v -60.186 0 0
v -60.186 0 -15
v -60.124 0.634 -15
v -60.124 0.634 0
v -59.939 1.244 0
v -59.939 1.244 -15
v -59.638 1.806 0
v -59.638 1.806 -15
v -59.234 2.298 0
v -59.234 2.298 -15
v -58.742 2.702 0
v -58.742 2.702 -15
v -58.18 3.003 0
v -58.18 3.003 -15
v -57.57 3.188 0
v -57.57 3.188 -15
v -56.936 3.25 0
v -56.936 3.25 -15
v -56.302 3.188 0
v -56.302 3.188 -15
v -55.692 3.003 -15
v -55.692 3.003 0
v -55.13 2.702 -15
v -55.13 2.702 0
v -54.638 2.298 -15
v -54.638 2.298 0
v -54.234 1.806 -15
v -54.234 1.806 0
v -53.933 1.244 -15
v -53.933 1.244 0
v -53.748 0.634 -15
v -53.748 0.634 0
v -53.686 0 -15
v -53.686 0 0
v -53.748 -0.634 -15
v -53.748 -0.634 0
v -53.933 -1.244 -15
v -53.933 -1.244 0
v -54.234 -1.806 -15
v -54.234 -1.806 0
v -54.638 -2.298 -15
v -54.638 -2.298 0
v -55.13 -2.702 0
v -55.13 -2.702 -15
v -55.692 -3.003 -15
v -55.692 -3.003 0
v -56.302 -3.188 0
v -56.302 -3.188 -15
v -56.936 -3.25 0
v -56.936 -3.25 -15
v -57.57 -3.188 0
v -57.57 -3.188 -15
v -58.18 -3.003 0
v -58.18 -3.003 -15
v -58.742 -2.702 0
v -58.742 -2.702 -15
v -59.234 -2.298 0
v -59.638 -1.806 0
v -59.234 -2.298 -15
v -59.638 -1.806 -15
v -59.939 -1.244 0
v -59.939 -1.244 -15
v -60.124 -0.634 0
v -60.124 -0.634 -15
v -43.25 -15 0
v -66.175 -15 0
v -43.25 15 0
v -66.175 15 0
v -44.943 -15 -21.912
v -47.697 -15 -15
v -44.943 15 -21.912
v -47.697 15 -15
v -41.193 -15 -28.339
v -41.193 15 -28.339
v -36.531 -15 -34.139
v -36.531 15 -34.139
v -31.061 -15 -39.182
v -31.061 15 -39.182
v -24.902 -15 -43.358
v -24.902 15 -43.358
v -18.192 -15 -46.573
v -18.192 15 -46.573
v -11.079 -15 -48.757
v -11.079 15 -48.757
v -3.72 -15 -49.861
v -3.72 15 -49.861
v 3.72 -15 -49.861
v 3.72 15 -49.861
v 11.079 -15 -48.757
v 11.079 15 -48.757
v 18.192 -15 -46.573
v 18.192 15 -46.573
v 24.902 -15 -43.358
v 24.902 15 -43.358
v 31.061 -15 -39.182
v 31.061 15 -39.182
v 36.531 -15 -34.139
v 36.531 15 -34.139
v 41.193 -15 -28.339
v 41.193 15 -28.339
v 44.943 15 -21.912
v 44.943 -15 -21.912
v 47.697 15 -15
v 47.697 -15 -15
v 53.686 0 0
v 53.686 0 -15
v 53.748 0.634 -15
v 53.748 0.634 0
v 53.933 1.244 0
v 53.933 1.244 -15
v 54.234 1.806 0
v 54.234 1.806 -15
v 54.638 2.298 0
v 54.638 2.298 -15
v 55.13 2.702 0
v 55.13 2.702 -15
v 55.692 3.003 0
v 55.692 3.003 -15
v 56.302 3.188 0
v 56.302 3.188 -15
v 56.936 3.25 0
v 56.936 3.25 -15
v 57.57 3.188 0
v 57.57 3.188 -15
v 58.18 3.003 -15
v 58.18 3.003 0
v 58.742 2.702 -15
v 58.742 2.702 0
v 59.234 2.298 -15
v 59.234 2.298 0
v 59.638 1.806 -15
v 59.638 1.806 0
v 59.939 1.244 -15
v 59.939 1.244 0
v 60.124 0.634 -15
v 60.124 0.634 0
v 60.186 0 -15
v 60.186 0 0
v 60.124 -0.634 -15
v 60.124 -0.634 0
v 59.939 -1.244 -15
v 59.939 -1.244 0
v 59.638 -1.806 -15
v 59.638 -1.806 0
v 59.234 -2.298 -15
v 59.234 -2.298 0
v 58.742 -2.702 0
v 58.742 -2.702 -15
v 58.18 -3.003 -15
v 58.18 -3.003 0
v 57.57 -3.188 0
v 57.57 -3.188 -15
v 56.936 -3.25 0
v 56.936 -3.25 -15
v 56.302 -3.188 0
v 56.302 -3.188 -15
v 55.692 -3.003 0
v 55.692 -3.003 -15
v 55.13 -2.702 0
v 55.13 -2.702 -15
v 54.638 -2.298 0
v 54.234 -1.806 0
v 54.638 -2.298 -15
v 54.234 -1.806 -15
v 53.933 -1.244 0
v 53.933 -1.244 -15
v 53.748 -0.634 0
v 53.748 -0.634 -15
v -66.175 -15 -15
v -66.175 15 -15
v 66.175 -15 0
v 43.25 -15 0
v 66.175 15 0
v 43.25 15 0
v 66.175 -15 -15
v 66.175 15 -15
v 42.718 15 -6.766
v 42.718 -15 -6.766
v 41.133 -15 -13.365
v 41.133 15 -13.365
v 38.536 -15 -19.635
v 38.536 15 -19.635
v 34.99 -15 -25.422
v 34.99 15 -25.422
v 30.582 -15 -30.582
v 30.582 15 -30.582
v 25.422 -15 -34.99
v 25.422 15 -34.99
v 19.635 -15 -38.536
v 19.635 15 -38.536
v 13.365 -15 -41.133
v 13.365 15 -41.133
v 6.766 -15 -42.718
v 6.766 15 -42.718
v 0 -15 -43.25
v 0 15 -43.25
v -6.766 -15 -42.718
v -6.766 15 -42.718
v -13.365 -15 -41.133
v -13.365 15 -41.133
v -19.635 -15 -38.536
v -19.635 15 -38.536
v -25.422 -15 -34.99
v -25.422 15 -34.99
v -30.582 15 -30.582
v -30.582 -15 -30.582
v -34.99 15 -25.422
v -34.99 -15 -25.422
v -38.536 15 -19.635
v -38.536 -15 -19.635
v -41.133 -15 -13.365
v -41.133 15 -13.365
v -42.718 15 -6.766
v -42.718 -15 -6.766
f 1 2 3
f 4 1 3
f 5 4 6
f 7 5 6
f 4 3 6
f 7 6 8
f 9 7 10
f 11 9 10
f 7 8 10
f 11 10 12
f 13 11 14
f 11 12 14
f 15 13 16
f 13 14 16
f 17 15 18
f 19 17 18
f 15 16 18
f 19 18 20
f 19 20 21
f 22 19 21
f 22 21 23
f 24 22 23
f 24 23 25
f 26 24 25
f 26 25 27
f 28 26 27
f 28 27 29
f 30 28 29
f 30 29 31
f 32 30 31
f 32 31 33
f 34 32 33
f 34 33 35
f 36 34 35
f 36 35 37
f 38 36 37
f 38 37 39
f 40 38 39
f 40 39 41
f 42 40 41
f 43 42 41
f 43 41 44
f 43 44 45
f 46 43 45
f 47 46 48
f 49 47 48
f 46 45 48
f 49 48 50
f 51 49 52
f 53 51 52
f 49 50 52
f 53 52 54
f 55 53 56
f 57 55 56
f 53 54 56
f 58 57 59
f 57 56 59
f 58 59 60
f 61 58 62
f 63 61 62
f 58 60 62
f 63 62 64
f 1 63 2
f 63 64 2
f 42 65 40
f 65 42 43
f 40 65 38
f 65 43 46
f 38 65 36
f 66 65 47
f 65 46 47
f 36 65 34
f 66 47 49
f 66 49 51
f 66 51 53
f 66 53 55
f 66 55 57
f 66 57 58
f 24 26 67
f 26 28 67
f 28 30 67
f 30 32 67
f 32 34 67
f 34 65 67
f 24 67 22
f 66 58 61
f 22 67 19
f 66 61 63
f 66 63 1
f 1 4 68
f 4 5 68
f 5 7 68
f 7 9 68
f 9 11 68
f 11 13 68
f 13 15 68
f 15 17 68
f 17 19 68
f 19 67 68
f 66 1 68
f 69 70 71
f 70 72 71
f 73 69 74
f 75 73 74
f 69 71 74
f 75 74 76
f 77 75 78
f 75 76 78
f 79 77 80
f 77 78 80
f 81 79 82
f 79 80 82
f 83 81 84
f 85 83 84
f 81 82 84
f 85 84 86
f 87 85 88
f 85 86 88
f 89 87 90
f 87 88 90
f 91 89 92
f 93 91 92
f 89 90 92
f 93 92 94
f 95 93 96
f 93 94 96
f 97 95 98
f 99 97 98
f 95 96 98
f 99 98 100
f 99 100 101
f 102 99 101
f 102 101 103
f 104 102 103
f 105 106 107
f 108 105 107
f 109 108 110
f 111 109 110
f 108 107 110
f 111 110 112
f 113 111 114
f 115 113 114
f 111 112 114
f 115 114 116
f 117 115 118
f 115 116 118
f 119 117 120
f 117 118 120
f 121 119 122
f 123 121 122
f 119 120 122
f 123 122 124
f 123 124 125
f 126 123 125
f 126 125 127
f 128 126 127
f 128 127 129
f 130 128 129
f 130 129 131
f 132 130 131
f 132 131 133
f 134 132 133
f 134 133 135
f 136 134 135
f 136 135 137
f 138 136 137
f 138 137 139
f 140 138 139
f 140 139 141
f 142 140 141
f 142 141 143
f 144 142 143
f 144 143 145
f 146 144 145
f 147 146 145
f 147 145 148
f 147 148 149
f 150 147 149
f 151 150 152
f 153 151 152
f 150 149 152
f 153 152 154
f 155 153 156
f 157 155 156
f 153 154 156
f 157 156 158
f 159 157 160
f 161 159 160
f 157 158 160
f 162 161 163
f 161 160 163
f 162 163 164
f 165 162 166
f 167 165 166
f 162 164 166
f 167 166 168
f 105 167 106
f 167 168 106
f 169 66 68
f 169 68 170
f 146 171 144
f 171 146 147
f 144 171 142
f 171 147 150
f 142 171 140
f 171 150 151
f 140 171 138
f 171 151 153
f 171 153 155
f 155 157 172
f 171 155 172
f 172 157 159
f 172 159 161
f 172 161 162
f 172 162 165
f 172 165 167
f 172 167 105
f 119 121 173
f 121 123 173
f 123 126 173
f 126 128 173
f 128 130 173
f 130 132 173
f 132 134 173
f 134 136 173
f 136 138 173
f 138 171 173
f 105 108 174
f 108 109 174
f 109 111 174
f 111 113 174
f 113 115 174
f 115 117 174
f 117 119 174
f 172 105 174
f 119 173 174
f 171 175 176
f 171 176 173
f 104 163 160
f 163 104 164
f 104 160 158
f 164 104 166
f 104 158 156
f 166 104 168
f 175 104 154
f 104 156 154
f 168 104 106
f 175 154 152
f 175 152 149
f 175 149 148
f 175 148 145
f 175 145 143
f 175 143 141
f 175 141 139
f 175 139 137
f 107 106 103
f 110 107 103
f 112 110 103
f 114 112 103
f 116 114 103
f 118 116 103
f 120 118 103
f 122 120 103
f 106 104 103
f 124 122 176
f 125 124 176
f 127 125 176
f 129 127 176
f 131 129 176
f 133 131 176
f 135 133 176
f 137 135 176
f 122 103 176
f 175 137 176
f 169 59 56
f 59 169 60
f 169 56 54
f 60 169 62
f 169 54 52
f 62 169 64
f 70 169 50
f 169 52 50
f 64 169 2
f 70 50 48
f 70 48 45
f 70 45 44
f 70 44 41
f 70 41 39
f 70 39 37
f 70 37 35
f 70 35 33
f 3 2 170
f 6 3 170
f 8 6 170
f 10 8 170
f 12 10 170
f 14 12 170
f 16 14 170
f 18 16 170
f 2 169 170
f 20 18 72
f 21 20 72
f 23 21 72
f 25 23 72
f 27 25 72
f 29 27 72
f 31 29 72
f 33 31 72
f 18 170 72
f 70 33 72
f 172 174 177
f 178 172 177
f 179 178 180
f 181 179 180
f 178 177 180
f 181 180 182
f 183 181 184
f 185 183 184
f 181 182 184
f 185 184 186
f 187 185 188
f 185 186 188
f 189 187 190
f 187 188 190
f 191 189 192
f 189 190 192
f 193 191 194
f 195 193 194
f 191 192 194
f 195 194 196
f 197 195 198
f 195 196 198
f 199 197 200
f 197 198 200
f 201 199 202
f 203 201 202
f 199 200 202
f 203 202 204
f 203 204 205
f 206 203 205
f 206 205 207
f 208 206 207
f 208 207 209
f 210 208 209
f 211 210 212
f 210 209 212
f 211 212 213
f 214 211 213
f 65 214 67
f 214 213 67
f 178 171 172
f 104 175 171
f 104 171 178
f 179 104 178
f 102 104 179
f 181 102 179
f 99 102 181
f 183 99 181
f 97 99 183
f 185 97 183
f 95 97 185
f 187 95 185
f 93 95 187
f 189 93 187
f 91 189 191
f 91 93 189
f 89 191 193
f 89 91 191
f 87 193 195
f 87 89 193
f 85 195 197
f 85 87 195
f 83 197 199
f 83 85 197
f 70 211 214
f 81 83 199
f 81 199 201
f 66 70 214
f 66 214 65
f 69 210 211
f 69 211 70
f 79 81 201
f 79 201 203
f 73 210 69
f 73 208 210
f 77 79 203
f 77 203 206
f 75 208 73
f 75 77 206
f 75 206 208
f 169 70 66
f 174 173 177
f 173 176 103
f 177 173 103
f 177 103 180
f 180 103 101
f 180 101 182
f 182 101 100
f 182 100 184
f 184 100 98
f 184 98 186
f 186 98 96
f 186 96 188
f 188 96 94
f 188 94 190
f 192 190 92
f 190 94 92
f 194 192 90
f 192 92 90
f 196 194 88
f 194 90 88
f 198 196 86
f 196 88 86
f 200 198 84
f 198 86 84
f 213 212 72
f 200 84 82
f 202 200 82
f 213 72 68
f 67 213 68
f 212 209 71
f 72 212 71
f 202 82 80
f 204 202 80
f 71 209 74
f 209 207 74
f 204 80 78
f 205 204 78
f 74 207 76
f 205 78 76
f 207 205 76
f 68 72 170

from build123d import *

# Parameters (mm, degrees)
BOSS_EXTRUDE1_DEPTH = 15
SKETCH2_R           = 3.25
CUT_EXTRUDE1_DEPTH  = 77.348743441


with BuildPart() as part:
    # Sketch1 → Boss-Extrude1 (new, symmetric)
    with BuildSketch(Plane(origin=(0, 0, 0), x_dir=(1, 0, 0), z_dir=(0, 1, 0))):
        with BuildLine():
            Line((-66.175, 0), (-66.175, 15))
            Line((-66.175, 15), (-47.696960071, 15))
            ThreePointArc((-47.696960071, 15), (0, 50), (47.696960071, 15))
            Line((47.696960071, 15), (66.175, 15))
            Line((66.175, 15), (66.175, 0))
            Line((66.175, 0), (43.25, 0))
            ThreePointArc((43.25, 0), (0, 43.25), (-43.25, 0))
            Line((-43.25, 0), (-66.175, 0))
        make_face()
    extrude(amount=BOSS_EXTRUDE1_DEPTH, both=True)

    # Sketch2 → Cut-Extrude1 (cut, through all)
    with BuildSketch(Plane(origin=(0, 0, -15), x_dir=(-1, 0, 0), z_dir=(0, 0, -1))):
        with Locations((56.935980035, 0)):
            Circle(SKETCH2_R)
        with Locations((-56.935980035, 0)):
            Circle(SKETCH2_R)
    extrude(amount=-CUT_EXTRUDE1_DEPTH, mode=Mode.SUBTRACT)


solid = part.part
